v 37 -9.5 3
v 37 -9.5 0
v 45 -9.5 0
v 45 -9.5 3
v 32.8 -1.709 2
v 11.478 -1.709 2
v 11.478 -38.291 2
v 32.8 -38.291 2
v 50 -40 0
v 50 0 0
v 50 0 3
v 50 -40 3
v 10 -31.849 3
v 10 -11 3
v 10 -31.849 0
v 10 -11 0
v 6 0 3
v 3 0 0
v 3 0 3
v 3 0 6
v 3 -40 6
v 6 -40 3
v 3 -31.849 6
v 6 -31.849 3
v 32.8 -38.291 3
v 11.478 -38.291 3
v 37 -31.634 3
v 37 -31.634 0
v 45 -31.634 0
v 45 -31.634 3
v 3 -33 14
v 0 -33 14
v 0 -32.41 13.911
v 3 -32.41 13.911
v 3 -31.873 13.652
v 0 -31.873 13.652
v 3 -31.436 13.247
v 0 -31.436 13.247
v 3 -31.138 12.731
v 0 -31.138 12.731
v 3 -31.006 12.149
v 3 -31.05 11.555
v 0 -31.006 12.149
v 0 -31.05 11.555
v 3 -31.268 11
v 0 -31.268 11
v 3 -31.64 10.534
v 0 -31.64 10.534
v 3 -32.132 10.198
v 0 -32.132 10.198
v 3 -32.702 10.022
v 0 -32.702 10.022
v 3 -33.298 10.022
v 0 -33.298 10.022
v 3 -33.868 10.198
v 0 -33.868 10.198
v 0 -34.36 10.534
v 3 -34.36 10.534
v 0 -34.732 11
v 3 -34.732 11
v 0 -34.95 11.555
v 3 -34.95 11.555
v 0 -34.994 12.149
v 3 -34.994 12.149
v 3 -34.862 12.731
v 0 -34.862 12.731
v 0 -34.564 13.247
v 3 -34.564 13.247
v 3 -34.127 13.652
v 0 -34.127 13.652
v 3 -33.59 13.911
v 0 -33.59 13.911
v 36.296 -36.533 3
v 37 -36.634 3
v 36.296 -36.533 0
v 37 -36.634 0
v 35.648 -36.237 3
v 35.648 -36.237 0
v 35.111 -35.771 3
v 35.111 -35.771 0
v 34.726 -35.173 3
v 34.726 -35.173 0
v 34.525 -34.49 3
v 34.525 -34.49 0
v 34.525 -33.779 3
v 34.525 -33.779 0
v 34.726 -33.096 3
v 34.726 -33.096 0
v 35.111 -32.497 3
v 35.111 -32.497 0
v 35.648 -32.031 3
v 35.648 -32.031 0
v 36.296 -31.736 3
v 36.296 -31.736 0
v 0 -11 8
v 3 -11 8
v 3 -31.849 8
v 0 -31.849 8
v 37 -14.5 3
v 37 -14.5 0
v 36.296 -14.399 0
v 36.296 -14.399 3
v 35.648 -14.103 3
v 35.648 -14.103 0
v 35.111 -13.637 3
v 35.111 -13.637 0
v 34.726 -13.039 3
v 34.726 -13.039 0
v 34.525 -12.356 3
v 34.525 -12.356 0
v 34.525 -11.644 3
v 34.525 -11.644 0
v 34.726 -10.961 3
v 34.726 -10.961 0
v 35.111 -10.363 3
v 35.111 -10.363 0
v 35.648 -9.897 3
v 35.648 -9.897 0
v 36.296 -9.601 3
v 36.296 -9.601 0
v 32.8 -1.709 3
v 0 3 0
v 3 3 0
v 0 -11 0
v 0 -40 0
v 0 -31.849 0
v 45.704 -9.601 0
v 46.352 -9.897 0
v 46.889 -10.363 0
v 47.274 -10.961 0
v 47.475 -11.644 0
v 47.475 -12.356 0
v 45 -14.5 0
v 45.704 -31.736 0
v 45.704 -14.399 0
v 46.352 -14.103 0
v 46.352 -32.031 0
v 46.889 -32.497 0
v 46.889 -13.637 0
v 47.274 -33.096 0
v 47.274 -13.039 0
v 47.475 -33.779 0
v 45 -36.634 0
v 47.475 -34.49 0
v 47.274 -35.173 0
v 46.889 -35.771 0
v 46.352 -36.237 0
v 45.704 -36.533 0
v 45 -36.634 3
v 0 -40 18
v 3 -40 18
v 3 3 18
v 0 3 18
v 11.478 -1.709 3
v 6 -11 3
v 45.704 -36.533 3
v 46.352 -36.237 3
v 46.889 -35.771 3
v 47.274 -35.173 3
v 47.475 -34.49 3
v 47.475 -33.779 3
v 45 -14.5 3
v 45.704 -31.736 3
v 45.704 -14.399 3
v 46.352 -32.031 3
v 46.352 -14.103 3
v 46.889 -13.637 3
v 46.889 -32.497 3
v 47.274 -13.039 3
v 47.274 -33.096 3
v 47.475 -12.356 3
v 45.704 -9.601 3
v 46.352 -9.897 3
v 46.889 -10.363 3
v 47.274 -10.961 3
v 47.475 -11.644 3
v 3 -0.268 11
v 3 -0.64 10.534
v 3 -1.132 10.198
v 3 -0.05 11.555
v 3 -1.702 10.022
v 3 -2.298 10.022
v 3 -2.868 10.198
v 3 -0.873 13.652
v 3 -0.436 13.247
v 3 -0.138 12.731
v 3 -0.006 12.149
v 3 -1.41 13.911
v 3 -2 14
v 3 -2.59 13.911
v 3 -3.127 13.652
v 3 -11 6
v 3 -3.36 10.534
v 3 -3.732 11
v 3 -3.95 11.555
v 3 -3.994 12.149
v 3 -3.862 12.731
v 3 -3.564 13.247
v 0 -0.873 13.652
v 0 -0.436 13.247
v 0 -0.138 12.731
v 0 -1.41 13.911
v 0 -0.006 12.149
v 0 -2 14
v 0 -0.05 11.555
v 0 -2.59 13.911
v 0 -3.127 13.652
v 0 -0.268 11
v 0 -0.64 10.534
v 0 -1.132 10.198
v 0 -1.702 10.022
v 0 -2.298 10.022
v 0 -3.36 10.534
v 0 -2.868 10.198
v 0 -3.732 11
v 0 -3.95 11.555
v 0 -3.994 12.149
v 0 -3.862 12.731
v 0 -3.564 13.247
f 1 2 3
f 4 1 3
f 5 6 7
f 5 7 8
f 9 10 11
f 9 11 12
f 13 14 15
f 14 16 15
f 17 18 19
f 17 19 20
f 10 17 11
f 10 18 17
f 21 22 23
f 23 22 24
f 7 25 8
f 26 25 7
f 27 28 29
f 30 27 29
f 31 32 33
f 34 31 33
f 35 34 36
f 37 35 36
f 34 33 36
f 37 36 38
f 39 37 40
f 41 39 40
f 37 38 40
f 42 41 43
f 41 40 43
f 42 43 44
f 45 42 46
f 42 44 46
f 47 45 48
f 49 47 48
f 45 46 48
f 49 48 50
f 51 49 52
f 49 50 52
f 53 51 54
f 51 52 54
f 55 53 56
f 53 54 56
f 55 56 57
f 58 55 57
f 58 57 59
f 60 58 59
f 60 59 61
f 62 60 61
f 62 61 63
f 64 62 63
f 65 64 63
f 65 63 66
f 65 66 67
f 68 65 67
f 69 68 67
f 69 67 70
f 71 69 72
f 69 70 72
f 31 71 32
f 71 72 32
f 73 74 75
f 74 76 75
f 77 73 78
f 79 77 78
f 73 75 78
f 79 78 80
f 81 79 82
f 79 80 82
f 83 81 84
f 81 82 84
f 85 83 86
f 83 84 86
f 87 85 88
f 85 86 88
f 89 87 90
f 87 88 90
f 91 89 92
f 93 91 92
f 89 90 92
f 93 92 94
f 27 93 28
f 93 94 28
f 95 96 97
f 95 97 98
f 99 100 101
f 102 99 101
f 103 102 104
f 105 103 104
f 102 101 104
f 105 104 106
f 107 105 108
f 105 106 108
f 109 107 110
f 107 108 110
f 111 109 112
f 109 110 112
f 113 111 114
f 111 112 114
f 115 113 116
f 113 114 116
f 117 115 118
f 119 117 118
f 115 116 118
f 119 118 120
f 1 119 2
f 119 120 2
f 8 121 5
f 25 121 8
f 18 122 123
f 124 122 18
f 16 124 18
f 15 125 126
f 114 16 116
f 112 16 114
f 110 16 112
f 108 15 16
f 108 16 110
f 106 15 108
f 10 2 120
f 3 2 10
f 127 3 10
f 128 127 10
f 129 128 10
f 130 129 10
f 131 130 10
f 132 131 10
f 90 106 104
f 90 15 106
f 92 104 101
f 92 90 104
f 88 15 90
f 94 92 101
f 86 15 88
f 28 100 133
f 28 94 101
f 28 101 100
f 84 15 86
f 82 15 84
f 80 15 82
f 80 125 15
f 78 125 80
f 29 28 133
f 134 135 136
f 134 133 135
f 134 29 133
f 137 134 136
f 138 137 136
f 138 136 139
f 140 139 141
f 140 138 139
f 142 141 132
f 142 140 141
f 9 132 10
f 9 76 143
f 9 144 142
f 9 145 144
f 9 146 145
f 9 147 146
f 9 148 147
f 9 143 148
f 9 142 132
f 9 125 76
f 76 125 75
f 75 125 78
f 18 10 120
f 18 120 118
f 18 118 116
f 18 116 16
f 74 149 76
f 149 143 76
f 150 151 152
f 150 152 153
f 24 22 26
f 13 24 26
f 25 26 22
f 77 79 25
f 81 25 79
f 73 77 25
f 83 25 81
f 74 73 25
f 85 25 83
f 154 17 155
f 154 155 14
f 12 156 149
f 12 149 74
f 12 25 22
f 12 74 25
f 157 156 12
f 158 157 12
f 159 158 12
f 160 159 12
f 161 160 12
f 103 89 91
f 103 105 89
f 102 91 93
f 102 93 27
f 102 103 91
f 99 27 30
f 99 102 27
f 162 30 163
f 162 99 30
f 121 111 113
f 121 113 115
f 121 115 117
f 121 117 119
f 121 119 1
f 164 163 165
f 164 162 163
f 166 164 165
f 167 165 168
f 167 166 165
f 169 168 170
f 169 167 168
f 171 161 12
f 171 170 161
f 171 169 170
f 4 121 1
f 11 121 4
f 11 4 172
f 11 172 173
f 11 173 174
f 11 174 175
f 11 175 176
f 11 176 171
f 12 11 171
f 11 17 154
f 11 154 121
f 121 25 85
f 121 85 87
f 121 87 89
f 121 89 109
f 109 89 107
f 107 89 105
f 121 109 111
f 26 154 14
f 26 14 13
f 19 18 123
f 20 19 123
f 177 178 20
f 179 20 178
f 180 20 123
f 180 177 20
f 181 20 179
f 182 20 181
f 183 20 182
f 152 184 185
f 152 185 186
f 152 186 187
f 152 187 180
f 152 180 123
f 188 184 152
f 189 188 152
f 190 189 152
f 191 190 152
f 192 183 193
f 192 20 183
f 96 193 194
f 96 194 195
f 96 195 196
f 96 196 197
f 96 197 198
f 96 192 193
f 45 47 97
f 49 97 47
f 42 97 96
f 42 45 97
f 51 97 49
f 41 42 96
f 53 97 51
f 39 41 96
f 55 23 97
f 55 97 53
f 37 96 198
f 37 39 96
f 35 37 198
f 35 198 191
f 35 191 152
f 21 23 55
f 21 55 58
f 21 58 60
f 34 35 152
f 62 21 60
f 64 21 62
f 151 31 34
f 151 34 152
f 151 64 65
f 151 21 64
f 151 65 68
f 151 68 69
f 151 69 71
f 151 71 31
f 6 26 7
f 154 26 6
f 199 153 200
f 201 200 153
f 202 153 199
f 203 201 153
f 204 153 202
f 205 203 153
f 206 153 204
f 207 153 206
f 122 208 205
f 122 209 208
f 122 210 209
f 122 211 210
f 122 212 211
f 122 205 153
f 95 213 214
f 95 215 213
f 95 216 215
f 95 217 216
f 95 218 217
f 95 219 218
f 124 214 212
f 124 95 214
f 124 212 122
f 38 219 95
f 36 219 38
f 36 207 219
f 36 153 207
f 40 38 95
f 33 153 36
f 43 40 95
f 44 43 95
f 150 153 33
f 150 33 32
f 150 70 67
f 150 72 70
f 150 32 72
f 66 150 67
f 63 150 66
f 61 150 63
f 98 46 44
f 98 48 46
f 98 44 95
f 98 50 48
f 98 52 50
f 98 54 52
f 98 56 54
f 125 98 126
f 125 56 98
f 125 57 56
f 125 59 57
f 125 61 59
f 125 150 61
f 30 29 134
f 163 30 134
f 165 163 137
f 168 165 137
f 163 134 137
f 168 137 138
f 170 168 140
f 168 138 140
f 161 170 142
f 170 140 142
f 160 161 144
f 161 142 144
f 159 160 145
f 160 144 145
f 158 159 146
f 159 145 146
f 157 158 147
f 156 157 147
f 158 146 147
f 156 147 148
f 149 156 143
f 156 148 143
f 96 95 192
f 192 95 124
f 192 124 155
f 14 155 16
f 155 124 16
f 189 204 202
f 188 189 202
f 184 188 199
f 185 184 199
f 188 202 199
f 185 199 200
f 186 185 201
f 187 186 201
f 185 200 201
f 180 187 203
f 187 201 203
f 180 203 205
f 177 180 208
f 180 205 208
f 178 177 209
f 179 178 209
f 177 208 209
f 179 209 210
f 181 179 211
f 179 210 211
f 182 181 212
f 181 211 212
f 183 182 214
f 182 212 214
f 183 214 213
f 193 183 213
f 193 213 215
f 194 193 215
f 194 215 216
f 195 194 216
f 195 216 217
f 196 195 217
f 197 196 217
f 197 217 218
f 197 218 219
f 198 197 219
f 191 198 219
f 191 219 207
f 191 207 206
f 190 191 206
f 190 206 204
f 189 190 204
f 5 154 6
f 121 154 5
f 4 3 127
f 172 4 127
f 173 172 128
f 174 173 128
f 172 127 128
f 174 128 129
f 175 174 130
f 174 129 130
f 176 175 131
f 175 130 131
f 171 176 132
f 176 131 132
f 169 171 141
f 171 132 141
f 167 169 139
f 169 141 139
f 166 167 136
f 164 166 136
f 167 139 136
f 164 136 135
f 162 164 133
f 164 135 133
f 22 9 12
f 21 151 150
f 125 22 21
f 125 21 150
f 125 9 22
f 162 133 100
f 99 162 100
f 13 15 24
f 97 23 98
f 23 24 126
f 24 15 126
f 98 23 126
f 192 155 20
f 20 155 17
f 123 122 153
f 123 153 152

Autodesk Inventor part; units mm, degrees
ref_plane "YZ Plane" through (0, 0, 0) normal (1, 0, 0) x (0, 1, 0)
ref_plane "XZ Plane" through (0, 0, 0) normal (0, 1, 0) x (-1, 0, 0)
ref_plane "XY Plane" through (0, 0, 0) normal (0, 0, 1) x (1, 0, 0)
sketch "Sketch1" plane through (0, 0, 0) normal (0, 0, 1) x (1, 0, 0)
  line L0 (0, 0) -> (50, 0)
  line L1 (50, 0) -> (50, -40)
  line L2 (50, -40) -> (0, -40)
  line L3 (0, -40) -> (0, 0)
  dimension "d0" = 50
  dimension "d1" = 40
extrude "Extrusion1" add sketch "Sketch1" along normal blind 3
sketch "Sketch2" plane through (0, 0, 3) normal (0, 0, 1) x (1, 0, 0)
  line L0 (0, -40) -> (50, -40) projected
  line L1 (0, 0) -> (3, 0)
  line L2 (3, 0) -> (3, -40)
  line L3 (3, -40) -> (0, -40)
  line L4 (0, -40) -> (0, 0)
  dimension "d4" = 3
extrude "Extrusion2" add sketch "Sketch2" along normal blind 15
sketch "Sketch3" plane through (0, 0, 0) normal (0, 1, 0) x (1, 0, 0)
  line L0 (0, 0) -> (3, 0)
  line L1 (3, 0) -> (3, -18)
  line L2 (3, -18) -> (0, -18)
  line L3 (0, -18) -> (0, 0)
extrude "Extrusion3" add sketch "Sketch3" along normal blind 3
sketch "Sketch4" plane through (0, 0, 0) normal (0, 0, -1) x (-1, 0, 0)
  line L0 (0, -40) -> (0, 3) projected
  line L1 (-3, 0) -> (-3, 3) projected
  line L2 (-3, 0) -> (-3, -11)
  line L3 (0, -11) -> (-10, -11)
  line L4 (-10, -11) -> (-10, -31.8493)
  line L5 (-10, -31.8493) -> (0, -31.8493)
  point P0 (0, 0)
  dimension "d9" = 11
  dimension "d10" = 10
extrude "Extrusion4" cut sketch "Sketch4" against normal blind 8
sketch "Sketch6" plane through (0, -40, 0) normal (-1, 0, 0) x (0, 0, 1)
  circle A0 centre (12, 38) radius 2
  point P0 (0, 40)
  dimension "d17" = 4
extrude "Extrusion6" cut sketch "Sketch6" against normal through all
sketch "Sketch7" plane through (0, -40, 0) normal (-1, 0, 0) x (0, 0, 1)
  circle A0 centre (12, 7) radius 2
  point P0 (0, 40)
  dimension "d21" = 4
extrude "Extrusion7" cut sketch "Sketch7" against normal through all
sketch "Sketch8" plane through (0, 0, 0) normal (0, 0, -1) x (-1, 0, 0)
  line L0 (-45, -12) -> (-37, -12) construction
  line L1 (-45, -14.5) -> (-37, -14.5)
  line L2 (-37, -9.5) -> (-45, -9.5)
  arc A0 (-45, -9.5) -> (-45, -14.5) centre (-45, -12) ccw
  arc A1 (-37, -14.5) -> (-37, -9.5) centre (-37, -12) ccw
  point P0 (0, 0)
  point P1 (-41, -12)
  dimension "d27" = 8
  dimension "d28" = 5
extrude "Extrusion8" cut sketch "Sketch8" against normal through all
sketch "Sketch9" plane through (0, 0, 0) normal (0, 0, -1) x (-1, 0, 0)
  line L0 (-37, -14.5) -> (-45, -14.5) projected
  line L1 (-45, -34.1343) -> (-37, -34.1343) construction
  line L2 (-45, -36.6343) -> (-37, -36.6343)
  line L3 (-37, -31.6343) -> (-45, -31.6343)
  arc A0 (-45, -31.6343) -> (-45, -36.6343) centre (-45, -34.1343) ccw
  arc A1 (-37, -36.6343) -> (-37, -31.6343) centre (-37, -34.1343) ccw
  point P0 (0, 0)
  point P1 (-41, -34.1343)
  dimension "d31" = 8
  dimension "d32" = 5
extrude "Extrusion9" cut sketch "Sketch9" against normal through all
sketch "Sketch10" plane through (0, 0, 3) normal (0, 0, 1) x (1, 0, 0)
  line L0 (11.4775, -1.7089) -> (32.8001, -1.7089)
  line L1 (32.8001, -1.7089) -> (32.8001, -38.2911)
  line L2 (32.8001, -38.2911) -> (11.4775, -38.2911)
  line L3 (11.4775, -38.2911) -> (11.4775, -1.7089)
  point P0 (0, 0)
extrude "Extrusion10" cut sketch "Sketch10" against normal blind 1
chamfer "Chamfer1" distance 3 angle 45 1 edges at (3, -35.9246, 3)
chamfer "Chamfer2" distance 3 angle 45 1 edges at (3, -5.5, 3)
properties part number "bart z endstop bracket v9"
